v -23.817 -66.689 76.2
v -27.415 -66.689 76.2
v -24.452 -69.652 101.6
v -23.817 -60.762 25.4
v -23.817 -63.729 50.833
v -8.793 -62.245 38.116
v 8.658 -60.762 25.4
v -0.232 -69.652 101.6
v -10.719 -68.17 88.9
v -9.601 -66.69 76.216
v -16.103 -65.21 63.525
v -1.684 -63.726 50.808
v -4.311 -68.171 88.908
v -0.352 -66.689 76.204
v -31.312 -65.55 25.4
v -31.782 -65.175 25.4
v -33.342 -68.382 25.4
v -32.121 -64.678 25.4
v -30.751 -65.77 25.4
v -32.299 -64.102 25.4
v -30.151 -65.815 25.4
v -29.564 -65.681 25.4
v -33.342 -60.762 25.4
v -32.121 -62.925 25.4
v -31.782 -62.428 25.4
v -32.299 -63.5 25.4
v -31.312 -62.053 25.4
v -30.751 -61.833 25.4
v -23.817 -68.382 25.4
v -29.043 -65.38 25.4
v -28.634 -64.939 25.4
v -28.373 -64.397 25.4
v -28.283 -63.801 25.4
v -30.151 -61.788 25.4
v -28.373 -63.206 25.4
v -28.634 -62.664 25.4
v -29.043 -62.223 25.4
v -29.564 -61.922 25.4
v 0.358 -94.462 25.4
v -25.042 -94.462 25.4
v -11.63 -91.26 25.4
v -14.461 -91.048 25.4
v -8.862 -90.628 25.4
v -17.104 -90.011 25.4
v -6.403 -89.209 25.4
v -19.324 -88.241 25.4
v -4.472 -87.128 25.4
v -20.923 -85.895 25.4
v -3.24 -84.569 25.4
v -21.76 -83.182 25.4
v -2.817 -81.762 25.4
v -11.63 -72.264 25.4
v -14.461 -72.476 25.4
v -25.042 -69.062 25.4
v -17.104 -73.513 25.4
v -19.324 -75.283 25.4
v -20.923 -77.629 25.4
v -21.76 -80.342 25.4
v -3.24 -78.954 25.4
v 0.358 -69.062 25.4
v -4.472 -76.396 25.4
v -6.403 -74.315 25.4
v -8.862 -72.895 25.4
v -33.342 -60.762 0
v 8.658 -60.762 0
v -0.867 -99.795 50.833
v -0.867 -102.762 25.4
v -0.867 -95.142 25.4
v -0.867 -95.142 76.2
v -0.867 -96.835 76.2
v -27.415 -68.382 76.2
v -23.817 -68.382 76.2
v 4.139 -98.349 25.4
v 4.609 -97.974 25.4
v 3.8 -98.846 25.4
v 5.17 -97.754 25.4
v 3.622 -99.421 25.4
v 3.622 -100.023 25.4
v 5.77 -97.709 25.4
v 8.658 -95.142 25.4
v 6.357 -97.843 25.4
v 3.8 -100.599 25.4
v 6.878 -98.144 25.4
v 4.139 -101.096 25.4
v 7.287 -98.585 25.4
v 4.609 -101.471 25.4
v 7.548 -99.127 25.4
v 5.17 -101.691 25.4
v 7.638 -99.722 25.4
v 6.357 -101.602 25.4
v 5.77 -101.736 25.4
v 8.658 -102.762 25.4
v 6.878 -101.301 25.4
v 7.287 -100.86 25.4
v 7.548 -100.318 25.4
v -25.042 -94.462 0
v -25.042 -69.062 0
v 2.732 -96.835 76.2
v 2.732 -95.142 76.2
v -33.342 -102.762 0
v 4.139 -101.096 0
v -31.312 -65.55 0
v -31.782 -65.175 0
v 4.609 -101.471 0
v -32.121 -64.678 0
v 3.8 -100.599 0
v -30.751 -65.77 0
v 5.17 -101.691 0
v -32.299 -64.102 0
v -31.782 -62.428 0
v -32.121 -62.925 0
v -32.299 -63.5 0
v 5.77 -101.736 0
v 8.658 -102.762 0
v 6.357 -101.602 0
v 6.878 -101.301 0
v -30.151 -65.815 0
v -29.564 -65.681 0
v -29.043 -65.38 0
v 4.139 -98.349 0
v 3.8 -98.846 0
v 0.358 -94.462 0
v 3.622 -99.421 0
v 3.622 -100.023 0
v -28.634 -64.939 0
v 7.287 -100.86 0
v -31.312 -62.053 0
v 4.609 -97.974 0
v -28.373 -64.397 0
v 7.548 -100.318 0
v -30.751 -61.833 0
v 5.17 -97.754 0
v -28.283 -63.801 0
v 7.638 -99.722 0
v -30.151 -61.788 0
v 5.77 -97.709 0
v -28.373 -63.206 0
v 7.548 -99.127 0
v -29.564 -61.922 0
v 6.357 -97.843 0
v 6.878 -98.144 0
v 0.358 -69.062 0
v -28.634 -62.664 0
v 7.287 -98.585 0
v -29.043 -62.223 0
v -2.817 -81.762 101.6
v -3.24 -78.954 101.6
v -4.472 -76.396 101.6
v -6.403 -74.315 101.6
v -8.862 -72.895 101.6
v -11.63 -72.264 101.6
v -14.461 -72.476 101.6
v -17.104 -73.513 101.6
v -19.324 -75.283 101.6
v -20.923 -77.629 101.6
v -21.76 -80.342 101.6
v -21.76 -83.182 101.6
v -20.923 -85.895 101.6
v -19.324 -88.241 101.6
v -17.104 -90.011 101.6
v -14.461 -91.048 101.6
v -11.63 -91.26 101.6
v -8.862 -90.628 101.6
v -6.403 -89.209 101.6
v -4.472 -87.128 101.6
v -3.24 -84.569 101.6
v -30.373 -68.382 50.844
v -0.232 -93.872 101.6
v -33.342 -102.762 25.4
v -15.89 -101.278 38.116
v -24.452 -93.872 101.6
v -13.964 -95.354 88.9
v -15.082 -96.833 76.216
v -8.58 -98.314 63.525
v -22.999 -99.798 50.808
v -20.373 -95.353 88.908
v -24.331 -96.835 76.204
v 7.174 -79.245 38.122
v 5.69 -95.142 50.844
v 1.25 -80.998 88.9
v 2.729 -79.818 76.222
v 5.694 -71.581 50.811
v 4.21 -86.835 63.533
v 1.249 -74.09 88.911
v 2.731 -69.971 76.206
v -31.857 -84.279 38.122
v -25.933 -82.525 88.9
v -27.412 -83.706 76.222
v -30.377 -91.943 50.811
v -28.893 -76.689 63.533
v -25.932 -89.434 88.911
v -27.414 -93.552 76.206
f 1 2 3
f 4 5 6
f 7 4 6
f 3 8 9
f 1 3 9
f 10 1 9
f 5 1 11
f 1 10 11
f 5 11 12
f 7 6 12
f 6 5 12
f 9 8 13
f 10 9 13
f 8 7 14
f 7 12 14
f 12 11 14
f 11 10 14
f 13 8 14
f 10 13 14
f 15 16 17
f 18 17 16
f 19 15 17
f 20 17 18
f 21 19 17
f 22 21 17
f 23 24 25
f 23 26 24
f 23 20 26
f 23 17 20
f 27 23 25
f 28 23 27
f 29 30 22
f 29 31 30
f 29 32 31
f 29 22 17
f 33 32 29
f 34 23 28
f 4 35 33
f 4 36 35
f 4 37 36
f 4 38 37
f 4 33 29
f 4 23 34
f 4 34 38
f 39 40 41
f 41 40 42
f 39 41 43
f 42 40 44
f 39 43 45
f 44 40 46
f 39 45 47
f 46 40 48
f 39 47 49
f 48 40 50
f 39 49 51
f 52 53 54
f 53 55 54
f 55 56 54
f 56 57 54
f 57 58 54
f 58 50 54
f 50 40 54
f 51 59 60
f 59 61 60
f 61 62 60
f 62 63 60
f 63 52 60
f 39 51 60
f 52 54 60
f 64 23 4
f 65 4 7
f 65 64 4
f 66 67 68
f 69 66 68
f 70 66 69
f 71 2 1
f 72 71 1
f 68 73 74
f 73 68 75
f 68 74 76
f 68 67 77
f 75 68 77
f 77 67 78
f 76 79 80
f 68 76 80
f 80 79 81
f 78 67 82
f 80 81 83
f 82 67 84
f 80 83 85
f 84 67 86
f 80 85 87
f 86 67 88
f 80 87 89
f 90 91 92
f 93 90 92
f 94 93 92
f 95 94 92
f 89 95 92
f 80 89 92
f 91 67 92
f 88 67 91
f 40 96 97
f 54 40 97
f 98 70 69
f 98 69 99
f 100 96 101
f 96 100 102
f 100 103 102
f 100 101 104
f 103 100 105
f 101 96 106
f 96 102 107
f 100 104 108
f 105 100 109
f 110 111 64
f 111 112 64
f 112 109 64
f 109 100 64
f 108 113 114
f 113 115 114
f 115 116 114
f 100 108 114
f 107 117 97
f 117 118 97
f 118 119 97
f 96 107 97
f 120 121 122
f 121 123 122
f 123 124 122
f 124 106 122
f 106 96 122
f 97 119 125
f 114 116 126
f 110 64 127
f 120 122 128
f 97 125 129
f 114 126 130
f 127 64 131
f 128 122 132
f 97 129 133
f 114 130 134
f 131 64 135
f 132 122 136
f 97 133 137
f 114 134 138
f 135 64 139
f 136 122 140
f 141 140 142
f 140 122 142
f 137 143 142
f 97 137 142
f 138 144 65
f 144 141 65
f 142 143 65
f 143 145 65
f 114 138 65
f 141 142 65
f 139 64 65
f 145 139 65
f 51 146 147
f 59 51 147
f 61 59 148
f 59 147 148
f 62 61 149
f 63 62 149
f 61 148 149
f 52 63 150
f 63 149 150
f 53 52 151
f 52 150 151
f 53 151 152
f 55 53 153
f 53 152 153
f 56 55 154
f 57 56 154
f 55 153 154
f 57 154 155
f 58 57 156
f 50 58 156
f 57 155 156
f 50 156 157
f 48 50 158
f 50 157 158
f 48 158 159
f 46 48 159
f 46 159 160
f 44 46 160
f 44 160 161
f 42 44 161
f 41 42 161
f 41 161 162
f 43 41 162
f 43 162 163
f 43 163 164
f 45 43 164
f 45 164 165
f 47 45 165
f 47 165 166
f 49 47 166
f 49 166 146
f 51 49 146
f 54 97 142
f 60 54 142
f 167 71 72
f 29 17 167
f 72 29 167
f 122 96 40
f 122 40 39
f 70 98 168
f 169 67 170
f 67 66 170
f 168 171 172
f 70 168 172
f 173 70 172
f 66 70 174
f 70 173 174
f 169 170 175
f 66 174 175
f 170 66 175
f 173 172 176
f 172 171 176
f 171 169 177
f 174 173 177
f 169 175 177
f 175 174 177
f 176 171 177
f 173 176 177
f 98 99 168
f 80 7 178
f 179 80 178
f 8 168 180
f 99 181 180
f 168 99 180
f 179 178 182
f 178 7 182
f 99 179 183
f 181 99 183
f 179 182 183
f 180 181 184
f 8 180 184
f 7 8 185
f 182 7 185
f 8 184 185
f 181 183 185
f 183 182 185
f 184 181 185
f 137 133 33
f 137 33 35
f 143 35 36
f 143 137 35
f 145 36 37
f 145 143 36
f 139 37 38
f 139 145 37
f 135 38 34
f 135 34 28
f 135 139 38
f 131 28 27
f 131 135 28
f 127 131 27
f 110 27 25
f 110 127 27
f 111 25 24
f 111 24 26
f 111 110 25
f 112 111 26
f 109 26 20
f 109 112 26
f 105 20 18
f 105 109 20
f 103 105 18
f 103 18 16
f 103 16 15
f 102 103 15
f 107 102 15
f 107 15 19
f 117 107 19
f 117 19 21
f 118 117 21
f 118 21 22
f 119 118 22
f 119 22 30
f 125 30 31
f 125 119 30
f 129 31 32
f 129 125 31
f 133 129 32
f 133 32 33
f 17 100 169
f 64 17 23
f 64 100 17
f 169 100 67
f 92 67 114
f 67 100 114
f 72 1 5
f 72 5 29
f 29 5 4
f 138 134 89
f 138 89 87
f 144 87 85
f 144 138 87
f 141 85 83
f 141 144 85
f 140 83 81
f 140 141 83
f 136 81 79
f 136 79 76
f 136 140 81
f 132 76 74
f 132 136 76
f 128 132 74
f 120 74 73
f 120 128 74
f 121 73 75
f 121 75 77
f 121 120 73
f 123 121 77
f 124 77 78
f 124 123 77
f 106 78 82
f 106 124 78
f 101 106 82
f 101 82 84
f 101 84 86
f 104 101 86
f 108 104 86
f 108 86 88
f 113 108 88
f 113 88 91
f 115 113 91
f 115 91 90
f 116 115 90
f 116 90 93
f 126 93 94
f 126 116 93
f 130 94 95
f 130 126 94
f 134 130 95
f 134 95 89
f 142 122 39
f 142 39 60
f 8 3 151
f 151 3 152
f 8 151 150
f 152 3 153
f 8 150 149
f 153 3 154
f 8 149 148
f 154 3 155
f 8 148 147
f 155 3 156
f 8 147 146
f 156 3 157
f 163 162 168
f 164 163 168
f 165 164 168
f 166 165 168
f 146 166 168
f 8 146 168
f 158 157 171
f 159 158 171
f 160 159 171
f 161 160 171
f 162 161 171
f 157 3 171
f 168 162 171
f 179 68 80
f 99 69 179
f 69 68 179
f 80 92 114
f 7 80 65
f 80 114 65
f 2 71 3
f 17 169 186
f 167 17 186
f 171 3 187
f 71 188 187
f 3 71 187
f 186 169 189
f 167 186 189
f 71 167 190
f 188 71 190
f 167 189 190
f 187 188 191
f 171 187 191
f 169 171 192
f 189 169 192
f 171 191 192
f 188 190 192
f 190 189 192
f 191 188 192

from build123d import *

# Parameters (mm, degrees)
SKETCH1_W           = 42
SKETCH1_H           = 42
SKETCH1_R           = 2.0193
SKETCH1_W_2         = 25.4
SKETCH1_H_2         = 25.4
BOSS_EXTRUDE2_DEPTH = 25.4
SKETCH17_R          = 9.525
CUT_EXTRUDE11_DEPTH = 149.304520227
SKETCH18_W          = 19.05
SKETCH18_H          = 50.8
CUT_EXTRUDE16_DEPTH = 7.62
SKETCH19_W          = 19.05
SKETCH19_H          = 50.8
CUT_EXTRUDE17_DEPTH = 7.62


with BuildPart() as part:
    # Sketch1 → Boss-Extrude2 (new body)
    with BuildSketch(Plane.XY):
        with Locations((-12.341618953, -81.761895361)):
            Rectangle(SKETCH1_W, SKETCH1_H)
        with Locations((-30.302131195, -63.801383119)):
            Circle(SKETCH1_R, mode=Mode.SUBTRACT)
        with Locations((5.618893289, -99.722407603)):
            Circle(SKETCH1_R, mode=Mode.SUBTRACT)
        with Locations((-12.341618953, -81.761895361)):
            Rectangle(SKETCH1_W_2, SKETCH1_H_2, mode=Mode.SUBTRACT)
    extrude(amount=BOSS_EXTRUDE2_DEPTH)

    # Sketch16 → Loft3 section 0
    with BuildSketch(Plane.XY.offset(25.4)):
        with BuildLine():
            Line((-33.341618953, -102.761895361), (-33.341618953, -60.761895361))
            Line((-33.341618953, -60.761895361), (8.658381047, -60.761895361))
            Line((8.658381047, -60.761895361), (8.658381047, -102.761895361))
            Line((8.658381047, -102.761895361), (-33.341618953, -102.761895361))
        make_face()
    # Sketch14 → Loft3 section 1
    with BuildSketch(Plane.XY.offset(101.6)):
        with BuildLine():
            Line((-0.231618953, -93.871895361), (-0.231618953, -69.651895361))
            Line((-0.231618953, -69.651895361), (-24.451618953, -69.651895361))
            Line((-24.451618953, -69.651895361), (-24.451618953, -93.871895361))
            Line((-24.451618953, -93.871895361), (-0.231618953, -93.871895361))
        make_face()
    loft()

    # Sketch17 → Cut-Extrude11 (cut, through all)
    with BuildSketch(Plane.XY.offset(101.6)):
        with Locations((-12.341618953, -81.761895361)):
            Circle(SKETCH17_R)
    extrude(amount=-CUT_EXTRUDE11_DEPTH, mode=Mode.SUBTRACT)

    # Sketch18 → Cut-Extrude16 (cut)
    with BuildSketch(Plane(origin=(0, -60.761895361, 0), x_dir=(1, 0, 0), z_dir=(0, 1, 0))):
        with Locations((-33.341618953, -50.8)):
            Rectangle(SKETCH18_W, SKETCH18_H)
    extrude(amount=-CUT_EXTRUDE16_DEPTH, mode=Mode.SUBTRACT)

    # Sketch19 → Cut-Extrude17 (cut)
    with BuildSketch(Plane.XZ.offset(102.761895361)):
        with Locations((8.658381047, 50.8)):
            Rectangle(SKETCH19_W, SKETCH19_H)
    extrude(amount=-CUT_EXTRUDE17_DEPTH, mode=Mode.SUBTRACT)


solid = part.part
